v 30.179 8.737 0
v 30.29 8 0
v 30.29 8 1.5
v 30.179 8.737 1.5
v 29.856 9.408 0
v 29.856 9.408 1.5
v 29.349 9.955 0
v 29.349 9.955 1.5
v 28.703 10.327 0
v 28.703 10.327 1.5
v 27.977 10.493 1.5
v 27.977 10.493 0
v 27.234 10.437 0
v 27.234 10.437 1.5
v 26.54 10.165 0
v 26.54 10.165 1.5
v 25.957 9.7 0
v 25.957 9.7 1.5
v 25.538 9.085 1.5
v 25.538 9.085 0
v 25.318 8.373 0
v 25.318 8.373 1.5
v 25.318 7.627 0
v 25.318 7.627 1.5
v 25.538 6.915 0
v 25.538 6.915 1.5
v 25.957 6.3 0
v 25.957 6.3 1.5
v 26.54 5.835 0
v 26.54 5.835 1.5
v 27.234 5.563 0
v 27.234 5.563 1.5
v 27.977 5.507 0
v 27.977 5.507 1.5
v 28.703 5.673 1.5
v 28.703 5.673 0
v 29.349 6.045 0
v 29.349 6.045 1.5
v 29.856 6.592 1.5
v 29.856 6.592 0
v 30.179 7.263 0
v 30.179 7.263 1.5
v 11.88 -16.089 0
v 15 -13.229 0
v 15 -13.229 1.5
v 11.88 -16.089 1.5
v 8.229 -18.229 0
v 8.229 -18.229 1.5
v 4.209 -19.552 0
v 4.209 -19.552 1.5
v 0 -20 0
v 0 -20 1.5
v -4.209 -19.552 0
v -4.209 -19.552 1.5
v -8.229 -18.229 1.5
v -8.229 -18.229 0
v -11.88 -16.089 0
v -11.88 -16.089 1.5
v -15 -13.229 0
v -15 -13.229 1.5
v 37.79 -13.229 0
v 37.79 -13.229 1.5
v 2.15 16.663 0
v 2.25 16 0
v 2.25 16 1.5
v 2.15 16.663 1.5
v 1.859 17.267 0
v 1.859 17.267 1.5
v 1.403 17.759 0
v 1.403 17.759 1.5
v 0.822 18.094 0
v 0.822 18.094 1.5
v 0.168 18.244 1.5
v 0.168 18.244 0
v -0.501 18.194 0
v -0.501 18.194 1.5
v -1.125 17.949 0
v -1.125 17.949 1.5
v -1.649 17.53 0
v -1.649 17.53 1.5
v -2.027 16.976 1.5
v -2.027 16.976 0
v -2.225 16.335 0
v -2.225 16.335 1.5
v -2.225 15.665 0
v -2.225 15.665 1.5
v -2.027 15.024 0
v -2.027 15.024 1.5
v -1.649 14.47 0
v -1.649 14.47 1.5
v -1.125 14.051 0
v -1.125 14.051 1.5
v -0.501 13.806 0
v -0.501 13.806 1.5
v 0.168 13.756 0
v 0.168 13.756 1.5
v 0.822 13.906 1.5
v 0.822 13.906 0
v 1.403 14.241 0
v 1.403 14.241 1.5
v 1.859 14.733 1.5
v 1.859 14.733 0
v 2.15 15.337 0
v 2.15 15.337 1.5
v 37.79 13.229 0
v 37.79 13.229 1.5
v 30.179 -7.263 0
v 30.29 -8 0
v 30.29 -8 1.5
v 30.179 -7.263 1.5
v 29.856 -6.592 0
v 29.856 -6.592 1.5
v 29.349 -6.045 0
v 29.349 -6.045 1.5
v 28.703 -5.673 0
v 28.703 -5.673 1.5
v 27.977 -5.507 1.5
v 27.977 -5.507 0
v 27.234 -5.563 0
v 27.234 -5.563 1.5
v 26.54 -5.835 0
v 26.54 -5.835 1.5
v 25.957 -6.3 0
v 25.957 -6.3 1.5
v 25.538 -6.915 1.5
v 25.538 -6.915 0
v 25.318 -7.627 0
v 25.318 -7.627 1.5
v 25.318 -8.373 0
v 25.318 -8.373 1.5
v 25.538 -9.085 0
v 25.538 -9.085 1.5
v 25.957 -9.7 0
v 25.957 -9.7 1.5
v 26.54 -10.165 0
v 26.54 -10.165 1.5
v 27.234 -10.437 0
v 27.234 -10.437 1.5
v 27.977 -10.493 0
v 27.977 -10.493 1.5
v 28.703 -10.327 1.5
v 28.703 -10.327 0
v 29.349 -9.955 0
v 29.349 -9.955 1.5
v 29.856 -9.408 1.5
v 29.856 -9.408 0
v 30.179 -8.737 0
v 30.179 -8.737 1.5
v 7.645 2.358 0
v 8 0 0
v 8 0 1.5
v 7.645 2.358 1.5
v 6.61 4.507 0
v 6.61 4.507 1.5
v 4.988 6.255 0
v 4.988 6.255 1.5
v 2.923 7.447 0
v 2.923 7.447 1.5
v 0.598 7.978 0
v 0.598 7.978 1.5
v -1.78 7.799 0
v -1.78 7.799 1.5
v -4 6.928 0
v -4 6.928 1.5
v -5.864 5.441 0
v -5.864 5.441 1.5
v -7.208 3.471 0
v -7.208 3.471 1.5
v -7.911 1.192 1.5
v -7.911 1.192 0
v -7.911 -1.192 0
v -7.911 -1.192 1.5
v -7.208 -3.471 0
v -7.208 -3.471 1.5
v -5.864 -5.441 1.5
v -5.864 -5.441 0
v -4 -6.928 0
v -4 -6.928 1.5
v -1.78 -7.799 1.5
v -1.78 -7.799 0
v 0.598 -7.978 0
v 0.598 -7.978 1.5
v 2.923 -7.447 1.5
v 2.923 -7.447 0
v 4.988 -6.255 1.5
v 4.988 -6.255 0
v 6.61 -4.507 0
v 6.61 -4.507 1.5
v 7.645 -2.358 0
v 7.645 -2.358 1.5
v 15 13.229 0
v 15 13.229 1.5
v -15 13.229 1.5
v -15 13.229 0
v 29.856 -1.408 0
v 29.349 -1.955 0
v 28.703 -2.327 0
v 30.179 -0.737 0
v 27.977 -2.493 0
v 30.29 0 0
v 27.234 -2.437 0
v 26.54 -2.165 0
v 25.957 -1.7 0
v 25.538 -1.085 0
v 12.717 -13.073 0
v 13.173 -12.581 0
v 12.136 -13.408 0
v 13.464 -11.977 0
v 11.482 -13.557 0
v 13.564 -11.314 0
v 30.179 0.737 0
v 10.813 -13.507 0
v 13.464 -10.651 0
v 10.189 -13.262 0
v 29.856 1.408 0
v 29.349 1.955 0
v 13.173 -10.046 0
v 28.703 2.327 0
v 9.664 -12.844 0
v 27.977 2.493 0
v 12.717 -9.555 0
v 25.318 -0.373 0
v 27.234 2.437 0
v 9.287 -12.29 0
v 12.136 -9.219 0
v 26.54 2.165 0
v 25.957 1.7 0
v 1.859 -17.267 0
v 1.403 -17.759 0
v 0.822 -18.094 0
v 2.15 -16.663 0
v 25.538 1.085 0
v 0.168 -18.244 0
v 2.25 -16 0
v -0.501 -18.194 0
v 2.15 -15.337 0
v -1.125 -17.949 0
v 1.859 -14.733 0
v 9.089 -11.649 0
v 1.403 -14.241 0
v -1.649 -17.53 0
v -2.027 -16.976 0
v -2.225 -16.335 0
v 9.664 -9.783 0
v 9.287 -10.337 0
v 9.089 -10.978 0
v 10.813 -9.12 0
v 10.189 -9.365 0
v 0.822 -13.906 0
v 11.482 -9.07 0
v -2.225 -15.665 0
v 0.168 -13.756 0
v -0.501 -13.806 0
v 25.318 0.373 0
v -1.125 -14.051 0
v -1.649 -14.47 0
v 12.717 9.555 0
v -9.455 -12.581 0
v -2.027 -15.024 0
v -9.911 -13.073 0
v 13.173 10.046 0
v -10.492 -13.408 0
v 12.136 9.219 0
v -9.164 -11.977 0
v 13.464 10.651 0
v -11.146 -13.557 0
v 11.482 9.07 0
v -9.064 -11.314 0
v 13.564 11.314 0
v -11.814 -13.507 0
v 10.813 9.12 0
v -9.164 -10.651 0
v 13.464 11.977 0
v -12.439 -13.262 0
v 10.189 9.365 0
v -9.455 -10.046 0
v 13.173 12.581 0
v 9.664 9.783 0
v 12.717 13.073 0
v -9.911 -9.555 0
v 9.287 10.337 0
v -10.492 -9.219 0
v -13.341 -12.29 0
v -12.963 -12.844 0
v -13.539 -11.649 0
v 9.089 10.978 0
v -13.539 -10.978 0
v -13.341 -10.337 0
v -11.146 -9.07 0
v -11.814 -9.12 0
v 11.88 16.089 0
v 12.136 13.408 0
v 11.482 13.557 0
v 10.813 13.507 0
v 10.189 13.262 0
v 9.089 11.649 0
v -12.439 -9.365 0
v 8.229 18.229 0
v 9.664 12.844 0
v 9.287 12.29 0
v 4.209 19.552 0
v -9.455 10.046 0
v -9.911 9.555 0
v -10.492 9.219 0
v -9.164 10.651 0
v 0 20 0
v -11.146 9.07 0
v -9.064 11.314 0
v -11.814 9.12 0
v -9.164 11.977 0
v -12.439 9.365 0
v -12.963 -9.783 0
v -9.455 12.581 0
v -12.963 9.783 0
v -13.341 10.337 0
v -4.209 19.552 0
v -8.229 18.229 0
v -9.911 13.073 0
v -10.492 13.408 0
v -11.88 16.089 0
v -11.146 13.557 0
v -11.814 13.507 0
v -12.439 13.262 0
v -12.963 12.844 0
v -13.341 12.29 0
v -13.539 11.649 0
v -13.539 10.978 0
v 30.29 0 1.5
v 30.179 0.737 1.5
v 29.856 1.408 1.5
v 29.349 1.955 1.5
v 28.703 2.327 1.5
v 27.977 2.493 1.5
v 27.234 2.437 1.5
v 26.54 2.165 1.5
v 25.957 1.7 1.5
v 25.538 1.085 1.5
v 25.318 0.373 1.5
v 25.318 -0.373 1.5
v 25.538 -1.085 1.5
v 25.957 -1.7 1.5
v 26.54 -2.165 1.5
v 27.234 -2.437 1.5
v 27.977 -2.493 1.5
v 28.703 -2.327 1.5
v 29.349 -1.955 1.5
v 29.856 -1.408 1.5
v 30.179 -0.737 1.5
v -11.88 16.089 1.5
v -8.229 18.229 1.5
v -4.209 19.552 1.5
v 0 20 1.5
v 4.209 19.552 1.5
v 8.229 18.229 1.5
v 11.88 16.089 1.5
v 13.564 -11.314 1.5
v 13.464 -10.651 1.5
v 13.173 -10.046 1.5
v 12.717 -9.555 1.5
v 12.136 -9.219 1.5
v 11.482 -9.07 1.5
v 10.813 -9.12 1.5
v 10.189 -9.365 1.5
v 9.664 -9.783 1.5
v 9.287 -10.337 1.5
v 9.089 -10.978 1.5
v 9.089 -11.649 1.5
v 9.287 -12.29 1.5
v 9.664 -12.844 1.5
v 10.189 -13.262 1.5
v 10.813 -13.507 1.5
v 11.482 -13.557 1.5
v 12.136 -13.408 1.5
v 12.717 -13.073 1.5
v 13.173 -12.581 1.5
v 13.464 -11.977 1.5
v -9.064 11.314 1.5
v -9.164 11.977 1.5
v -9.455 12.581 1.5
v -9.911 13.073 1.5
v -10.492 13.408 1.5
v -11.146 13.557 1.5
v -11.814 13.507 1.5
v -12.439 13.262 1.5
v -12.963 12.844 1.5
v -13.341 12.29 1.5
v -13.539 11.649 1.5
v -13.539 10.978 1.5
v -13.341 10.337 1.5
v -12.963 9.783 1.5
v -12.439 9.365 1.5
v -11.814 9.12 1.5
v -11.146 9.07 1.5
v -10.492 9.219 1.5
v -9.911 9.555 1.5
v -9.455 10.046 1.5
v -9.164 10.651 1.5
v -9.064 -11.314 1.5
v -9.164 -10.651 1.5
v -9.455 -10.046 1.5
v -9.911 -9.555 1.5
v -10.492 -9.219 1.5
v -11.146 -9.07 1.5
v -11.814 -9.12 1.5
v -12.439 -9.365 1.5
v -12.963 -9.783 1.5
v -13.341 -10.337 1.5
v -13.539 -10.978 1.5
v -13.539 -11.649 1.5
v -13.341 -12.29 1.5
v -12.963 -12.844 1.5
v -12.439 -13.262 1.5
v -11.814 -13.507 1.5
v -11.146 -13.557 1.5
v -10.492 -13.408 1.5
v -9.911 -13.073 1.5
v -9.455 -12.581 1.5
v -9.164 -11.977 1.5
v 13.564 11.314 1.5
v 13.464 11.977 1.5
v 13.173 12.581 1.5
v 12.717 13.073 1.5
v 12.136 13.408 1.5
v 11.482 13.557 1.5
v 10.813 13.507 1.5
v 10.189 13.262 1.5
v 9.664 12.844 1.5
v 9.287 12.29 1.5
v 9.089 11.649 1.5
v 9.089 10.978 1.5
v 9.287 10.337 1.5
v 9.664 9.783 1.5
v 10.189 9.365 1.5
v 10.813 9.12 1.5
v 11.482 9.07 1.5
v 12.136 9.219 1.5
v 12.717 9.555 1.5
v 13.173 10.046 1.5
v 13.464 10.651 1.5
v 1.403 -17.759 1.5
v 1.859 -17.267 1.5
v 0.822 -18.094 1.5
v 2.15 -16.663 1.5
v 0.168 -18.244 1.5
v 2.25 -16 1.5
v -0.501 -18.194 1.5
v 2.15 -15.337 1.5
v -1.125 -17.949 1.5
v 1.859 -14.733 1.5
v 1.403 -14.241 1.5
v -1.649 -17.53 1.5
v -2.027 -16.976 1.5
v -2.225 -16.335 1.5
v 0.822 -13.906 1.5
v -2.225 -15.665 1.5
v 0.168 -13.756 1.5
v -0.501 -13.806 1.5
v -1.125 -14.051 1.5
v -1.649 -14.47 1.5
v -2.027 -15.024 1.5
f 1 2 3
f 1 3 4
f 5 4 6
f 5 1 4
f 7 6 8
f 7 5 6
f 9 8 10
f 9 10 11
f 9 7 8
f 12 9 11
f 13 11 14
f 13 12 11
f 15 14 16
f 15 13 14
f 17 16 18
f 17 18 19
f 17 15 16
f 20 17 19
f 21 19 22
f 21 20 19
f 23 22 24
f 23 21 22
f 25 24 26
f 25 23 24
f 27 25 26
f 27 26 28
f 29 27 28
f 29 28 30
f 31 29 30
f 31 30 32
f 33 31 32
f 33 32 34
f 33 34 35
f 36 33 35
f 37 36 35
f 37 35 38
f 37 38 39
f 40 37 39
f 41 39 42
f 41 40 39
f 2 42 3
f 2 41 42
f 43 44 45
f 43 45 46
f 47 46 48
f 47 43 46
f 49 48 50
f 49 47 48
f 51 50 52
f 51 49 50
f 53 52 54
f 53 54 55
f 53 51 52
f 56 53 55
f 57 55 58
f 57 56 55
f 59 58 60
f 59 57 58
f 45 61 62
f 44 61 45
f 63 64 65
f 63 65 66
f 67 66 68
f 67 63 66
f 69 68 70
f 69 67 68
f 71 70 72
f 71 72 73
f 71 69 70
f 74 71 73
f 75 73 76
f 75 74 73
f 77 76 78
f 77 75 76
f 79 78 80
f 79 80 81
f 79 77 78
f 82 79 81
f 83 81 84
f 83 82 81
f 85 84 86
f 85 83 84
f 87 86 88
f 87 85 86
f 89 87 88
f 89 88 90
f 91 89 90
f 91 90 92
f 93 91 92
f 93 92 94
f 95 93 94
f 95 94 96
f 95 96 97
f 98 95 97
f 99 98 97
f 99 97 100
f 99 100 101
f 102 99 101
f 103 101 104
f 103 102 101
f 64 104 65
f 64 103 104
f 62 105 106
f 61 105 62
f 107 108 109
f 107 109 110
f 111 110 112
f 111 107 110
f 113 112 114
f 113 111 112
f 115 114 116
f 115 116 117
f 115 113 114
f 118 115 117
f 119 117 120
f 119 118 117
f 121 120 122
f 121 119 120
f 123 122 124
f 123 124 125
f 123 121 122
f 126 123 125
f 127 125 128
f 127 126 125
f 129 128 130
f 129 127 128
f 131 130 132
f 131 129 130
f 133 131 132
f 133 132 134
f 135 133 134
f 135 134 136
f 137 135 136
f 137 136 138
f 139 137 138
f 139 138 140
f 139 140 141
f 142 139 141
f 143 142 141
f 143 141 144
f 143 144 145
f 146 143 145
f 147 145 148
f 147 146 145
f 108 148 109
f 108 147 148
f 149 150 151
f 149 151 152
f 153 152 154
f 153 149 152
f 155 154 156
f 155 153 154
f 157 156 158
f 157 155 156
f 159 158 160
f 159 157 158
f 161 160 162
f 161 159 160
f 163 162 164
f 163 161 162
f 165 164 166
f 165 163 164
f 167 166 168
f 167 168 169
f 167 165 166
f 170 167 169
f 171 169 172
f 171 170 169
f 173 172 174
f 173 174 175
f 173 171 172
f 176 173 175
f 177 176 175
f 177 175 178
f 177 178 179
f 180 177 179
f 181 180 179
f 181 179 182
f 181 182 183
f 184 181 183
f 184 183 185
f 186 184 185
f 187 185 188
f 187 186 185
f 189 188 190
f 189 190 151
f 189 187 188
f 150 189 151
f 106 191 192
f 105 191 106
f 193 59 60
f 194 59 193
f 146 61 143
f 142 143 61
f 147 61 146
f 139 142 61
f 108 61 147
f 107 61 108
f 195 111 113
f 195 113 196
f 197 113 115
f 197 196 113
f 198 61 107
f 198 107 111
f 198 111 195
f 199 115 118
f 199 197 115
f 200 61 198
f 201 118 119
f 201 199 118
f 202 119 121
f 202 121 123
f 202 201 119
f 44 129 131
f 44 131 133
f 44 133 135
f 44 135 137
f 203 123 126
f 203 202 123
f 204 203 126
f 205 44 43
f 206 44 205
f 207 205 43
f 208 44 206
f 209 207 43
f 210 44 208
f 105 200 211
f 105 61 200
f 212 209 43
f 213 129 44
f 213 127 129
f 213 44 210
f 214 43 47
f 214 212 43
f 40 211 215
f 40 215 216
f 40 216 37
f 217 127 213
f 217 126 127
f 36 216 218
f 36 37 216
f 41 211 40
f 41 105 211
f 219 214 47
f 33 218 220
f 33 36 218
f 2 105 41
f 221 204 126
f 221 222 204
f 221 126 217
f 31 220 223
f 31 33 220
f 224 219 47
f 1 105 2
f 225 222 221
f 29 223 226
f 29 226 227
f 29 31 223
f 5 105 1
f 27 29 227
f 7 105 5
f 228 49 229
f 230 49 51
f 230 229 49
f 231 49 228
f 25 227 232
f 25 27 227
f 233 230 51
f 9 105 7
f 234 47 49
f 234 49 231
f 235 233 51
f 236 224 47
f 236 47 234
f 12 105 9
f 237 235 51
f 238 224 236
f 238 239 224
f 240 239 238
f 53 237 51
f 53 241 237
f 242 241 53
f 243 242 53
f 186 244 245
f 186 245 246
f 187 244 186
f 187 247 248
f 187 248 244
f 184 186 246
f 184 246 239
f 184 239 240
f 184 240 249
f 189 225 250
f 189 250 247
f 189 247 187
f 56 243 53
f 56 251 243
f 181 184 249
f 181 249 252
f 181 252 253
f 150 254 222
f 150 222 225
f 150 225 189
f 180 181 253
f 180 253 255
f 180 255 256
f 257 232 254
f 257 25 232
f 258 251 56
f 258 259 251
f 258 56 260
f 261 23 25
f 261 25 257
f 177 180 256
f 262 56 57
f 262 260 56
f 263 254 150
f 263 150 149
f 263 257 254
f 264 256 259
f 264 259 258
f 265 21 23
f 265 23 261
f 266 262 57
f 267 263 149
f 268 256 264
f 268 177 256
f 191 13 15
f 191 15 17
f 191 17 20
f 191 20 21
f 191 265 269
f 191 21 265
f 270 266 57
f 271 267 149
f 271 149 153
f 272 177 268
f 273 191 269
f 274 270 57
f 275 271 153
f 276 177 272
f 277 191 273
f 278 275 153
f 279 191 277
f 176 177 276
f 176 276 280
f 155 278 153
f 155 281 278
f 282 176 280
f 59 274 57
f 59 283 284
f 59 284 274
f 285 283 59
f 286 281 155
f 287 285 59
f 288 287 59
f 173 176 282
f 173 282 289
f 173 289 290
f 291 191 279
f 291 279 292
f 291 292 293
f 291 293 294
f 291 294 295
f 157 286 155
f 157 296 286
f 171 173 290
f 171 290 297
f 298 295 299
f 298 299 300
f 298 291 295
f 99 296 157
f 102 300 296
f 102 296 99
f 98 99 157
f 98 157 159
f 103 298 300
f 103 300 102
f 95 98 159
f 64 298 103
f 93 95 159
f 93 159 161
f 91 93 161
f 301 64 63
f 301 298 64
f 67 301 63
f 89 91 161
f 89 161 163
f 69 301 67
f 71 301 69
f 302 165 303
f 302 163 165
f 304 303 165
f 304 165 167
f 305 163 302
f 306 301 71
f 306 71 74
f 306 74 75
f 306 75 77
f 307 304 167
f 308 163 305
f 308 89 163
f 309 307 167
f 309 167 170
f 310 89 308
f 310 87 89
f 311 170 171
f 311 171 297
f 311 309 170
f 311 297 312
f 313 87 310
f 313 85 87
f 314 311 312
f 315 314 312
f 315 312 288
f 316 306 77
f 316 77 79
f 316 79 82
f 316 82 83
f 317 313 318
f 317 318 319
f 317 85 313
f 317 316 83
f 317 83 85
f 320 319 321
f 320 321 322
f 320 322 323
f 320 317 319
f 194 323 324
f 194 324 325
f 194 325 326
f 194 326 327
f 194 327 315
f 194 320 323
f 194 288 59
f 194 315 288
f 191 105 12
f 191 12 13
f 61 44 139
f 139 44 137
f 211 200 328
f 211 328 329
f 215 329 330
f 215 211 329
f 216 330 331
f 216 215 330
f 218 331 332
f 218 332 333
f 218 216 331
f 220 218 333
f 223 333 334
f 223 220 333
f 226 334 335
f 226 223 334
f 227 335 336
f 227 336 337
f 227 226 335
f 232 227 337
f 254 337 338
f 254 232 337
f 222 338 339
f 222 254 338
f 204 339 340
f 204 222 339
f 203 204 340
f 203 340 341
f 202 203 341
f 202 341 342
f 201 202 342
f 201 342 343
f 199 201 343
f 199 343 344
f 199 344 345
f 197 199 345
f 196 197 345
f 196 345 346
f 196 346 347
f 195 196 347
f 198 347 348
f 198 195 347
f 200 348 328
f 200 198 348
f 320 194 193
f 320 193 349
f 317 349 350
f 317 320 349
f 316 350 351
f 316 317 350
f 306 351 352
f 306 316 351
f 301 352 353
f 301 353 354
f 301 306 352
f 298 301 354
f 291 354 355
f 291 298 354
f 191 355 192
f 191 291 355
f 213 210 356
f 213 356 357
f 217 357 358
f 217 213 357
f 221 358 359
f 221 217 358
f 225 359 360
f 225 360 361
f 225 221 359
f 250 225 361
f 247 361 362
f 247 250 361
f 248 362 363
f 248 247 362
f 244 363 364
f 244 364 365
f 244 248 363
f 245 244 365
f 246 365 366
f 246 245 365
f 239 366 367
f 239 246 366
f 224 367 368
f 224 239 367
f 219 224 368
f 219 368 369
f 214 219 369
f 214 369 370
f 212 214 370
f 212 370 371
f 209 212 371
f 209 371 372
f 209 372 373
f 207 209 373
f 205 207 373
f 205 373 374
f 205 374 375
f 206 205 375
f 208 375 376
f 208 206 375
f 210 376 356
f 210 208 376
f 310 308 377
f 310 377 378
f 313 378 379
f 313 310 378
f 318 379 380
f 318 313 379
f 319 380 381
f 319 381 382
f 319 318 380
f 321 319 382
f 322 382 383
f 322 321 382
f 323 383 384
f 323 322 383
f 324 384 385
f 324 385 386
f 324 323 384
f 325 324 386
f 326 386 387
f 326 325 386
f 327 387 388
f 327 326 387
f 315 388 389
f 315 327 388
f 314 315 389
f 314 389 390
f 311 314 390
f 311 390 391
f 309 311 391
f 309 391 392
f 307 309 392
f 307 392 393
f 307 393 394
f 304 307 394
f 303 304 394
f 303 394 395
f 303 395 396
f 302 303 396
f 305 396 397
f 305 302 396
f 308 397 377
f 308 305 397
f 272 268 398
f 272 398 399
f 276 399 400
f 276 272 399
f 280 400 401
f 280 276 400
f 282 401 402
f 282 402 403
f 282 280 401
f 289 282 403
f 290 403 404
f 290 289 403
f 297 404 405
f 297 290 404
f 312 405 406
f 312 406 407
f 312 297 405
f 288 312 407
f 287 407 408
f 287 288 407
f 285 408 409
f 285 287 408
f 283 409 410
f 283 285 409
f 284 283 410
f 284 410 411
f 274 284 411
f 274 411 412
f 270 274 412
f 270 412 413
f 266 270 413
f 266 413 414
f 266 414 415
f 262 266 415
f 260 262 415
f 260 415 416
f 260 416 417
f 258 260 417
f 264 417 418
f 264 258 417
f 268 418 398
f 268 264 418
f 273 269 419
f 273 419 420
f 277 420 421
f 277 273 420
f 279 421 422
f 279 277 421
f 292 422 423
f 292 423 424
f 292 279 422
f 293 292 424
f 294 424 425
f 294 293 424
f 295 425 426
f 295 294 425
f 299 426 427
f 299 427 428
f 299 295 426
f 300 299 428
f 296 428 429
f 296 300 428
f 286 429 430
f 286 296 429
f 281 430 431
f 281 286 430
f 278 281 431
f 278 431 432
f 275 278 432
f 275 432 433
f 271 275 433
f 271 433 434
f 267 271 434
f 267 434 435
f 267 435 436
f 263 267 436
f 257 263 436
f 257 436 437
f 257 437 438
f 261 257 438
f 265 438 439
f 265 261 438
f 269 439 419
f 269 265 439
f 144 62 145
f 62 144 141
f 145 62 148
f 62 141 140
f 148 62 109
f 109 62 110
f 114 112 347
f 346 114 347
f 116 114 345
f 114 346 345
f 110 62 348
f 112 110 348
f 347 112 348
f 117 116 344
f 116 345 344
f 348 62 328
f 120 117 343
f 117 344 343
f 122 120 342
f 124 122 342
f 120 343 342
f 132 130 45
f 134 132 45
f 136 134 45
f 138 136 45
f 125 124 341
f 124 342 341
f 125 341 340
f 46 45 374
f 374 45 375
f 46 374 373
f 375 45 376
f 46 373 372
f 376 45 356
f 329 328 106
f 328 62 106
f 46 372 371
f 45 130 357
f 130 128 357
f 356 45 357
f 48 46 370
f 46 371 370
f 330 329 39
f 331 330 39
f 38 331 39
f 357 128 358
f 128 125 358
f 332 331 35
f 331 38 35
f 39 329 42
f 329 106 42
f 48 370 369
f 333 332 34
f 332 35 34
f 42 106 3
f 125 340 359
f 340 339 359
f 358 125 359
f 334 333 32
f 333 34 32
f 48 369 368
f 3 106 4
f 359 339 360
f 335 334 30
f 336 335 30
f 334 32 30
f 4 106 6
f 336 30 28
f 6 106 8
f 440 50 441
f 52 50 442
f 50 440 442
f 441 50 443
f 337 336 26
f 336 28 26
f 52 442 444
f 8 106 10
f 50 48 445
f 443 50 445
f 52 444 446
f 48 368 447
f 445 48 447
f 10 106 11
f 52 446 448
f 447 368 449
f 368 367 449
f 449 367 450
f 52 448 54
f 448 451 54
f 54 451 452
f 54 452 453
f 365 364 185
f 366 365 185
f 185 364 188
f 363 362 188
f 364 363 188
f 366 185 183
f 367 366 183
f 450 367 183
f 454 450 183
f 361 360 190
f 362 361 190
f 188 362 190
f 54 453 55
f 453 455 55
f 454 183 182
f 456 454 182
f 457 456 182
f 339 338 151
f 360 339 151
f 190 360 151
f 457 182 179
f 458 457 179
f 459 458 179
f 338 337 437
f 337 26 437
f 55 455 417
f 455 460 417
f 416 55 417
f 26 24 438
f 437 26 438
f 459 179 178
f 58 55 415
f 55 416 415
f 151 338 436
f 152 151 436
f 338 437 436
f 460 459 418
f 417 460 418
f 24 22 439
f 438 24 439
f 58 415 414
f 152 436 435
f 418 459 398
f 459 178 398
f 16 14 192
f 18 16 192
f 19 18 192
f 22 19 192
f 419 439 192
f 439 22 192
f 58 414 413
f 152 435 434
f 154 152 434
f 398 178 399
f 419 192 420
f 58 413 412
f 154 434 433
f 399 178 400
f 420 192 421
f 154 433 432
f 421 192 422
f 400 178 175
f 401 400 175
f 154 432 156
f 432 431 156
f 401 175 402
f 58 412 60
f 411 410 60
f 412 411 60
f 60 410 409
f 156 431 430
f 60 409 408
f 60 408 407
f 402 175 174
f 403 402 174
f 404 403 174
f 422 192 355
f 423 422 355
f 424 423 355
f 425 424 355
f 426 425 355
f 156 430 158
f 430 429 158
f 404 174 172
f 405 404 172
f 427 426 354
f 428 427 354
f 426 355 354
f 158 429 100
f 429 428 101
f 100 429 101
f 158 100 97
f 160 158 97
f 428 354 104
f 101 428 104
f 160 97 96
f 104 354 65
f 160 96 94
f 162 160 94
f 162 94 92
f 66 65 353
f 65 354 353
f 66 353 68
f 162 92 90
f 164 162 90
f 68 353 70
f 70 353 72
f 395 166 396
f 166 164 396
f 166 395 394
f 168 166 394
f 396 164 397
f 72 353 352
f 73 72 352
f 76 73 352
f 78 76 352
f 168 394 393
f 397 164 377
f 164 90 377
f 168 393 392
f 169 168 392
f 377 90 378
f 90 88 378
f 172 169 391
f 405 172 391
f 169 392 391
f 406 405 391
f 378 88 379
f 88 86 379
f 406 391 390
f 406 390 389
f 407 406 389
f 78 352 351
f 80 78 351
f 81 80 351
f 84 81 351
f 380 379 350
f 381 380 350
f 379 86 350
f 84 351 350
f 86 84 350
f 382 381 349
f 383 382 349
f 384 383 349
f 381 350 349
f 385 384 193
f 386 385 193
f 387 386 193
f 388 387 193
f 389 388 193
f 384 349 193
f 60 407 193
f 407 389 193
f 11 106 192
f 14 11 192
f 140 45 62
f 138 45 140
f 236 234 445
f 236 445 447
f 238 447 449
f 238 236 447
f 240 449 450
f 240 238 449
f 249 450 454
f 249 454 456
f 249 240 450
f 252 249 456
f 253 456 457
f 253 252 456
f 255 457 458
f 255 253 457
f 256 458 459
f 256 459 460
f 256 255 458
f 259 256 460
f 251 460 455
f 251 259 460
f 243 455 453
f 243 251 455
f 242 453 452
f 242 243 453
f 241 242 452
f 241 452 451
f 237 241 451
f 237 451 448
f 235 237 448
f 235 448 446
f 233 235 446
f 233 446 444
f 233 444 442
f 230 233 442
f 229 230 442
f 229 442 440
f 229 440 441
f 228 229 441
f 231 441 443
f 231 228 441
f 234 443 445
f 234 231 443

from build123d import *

# Parameters (mm, degrees)
SKETCH1_R           = 2.25
SKETCH1_R_2         = 8
SKETCH1_R_3         = 2.5
BOSS_EXTRUDE1_DEPTH = 1.5


with BuildPart() as part:
    # Sketch1 → Boss-Extrude1 (new body)
    with BuildSketch(Plane.XY):
        with BuildLine():
            Line((15, 13.228756555), (17.79, 13.228756555))
            Line((17.79, 13.228756555), (37.79, 13.228756555))
            Line((37.79, 13.228756555), (37.79, -13.228756555))
            Line((37.79, -13.228756555), (17.79, -13.228756555))
            Line((17.79, -13.228756555), (15, -13.228756555))
            ThreePointArc((15, -13.228756555), (0, -20), (-15, -13.228756555))
            Line((-15, -13.228756555), (-15, 13.228756555))
            ThreePointArc((-15, 13.228756555), (0, 20), (15, 13.228756555))
        make_face()
        with Locations((-11.313708499, 11.313708499)):
            Circle(SKETCH1_R, mode=Mode.SUBTRACT)
        with Locations((0, 16)):
            Circle(SKETCH1_R, mode=Mode.SUBTRACT)
        with Locations((11.313708499, 11.313708499)):
            Circle(SKETCH1_R, mode=Mode.SUBTRACT)
        with Locations((-11.313708499, -11.313708499)):
            Circle(SKETCH1_R, mode=Mode.SUBTRACT)
        with Locations((0, -16)):
            Circle(SKETCH1_R, mode=Mode.SUBTRACT)
        Circle(SKETCH1_R_2, mode=Mode.SUBTRACT)
        with Locations((11.313708499, -11.313708499)):
            Circle(SKETCH1_R, mode=Mode.SUBTRACT)
        with Locations((27.79, 0)):
            Circle(SKETCH1_R_3, mode=Mode.SUBTRACT)
        with Locations((27.79, 8)):
            Circle(SKETCH1_R_3, mode=Mode.SUBTRACT)
        with Locations((27.79, -8)):
            Circle(SKETCH1_R_3, mode=Mode.SUBTRACT)
    extrude(amount=BOSS_EXTRUDE1_DEPTH)


solid = part.part
